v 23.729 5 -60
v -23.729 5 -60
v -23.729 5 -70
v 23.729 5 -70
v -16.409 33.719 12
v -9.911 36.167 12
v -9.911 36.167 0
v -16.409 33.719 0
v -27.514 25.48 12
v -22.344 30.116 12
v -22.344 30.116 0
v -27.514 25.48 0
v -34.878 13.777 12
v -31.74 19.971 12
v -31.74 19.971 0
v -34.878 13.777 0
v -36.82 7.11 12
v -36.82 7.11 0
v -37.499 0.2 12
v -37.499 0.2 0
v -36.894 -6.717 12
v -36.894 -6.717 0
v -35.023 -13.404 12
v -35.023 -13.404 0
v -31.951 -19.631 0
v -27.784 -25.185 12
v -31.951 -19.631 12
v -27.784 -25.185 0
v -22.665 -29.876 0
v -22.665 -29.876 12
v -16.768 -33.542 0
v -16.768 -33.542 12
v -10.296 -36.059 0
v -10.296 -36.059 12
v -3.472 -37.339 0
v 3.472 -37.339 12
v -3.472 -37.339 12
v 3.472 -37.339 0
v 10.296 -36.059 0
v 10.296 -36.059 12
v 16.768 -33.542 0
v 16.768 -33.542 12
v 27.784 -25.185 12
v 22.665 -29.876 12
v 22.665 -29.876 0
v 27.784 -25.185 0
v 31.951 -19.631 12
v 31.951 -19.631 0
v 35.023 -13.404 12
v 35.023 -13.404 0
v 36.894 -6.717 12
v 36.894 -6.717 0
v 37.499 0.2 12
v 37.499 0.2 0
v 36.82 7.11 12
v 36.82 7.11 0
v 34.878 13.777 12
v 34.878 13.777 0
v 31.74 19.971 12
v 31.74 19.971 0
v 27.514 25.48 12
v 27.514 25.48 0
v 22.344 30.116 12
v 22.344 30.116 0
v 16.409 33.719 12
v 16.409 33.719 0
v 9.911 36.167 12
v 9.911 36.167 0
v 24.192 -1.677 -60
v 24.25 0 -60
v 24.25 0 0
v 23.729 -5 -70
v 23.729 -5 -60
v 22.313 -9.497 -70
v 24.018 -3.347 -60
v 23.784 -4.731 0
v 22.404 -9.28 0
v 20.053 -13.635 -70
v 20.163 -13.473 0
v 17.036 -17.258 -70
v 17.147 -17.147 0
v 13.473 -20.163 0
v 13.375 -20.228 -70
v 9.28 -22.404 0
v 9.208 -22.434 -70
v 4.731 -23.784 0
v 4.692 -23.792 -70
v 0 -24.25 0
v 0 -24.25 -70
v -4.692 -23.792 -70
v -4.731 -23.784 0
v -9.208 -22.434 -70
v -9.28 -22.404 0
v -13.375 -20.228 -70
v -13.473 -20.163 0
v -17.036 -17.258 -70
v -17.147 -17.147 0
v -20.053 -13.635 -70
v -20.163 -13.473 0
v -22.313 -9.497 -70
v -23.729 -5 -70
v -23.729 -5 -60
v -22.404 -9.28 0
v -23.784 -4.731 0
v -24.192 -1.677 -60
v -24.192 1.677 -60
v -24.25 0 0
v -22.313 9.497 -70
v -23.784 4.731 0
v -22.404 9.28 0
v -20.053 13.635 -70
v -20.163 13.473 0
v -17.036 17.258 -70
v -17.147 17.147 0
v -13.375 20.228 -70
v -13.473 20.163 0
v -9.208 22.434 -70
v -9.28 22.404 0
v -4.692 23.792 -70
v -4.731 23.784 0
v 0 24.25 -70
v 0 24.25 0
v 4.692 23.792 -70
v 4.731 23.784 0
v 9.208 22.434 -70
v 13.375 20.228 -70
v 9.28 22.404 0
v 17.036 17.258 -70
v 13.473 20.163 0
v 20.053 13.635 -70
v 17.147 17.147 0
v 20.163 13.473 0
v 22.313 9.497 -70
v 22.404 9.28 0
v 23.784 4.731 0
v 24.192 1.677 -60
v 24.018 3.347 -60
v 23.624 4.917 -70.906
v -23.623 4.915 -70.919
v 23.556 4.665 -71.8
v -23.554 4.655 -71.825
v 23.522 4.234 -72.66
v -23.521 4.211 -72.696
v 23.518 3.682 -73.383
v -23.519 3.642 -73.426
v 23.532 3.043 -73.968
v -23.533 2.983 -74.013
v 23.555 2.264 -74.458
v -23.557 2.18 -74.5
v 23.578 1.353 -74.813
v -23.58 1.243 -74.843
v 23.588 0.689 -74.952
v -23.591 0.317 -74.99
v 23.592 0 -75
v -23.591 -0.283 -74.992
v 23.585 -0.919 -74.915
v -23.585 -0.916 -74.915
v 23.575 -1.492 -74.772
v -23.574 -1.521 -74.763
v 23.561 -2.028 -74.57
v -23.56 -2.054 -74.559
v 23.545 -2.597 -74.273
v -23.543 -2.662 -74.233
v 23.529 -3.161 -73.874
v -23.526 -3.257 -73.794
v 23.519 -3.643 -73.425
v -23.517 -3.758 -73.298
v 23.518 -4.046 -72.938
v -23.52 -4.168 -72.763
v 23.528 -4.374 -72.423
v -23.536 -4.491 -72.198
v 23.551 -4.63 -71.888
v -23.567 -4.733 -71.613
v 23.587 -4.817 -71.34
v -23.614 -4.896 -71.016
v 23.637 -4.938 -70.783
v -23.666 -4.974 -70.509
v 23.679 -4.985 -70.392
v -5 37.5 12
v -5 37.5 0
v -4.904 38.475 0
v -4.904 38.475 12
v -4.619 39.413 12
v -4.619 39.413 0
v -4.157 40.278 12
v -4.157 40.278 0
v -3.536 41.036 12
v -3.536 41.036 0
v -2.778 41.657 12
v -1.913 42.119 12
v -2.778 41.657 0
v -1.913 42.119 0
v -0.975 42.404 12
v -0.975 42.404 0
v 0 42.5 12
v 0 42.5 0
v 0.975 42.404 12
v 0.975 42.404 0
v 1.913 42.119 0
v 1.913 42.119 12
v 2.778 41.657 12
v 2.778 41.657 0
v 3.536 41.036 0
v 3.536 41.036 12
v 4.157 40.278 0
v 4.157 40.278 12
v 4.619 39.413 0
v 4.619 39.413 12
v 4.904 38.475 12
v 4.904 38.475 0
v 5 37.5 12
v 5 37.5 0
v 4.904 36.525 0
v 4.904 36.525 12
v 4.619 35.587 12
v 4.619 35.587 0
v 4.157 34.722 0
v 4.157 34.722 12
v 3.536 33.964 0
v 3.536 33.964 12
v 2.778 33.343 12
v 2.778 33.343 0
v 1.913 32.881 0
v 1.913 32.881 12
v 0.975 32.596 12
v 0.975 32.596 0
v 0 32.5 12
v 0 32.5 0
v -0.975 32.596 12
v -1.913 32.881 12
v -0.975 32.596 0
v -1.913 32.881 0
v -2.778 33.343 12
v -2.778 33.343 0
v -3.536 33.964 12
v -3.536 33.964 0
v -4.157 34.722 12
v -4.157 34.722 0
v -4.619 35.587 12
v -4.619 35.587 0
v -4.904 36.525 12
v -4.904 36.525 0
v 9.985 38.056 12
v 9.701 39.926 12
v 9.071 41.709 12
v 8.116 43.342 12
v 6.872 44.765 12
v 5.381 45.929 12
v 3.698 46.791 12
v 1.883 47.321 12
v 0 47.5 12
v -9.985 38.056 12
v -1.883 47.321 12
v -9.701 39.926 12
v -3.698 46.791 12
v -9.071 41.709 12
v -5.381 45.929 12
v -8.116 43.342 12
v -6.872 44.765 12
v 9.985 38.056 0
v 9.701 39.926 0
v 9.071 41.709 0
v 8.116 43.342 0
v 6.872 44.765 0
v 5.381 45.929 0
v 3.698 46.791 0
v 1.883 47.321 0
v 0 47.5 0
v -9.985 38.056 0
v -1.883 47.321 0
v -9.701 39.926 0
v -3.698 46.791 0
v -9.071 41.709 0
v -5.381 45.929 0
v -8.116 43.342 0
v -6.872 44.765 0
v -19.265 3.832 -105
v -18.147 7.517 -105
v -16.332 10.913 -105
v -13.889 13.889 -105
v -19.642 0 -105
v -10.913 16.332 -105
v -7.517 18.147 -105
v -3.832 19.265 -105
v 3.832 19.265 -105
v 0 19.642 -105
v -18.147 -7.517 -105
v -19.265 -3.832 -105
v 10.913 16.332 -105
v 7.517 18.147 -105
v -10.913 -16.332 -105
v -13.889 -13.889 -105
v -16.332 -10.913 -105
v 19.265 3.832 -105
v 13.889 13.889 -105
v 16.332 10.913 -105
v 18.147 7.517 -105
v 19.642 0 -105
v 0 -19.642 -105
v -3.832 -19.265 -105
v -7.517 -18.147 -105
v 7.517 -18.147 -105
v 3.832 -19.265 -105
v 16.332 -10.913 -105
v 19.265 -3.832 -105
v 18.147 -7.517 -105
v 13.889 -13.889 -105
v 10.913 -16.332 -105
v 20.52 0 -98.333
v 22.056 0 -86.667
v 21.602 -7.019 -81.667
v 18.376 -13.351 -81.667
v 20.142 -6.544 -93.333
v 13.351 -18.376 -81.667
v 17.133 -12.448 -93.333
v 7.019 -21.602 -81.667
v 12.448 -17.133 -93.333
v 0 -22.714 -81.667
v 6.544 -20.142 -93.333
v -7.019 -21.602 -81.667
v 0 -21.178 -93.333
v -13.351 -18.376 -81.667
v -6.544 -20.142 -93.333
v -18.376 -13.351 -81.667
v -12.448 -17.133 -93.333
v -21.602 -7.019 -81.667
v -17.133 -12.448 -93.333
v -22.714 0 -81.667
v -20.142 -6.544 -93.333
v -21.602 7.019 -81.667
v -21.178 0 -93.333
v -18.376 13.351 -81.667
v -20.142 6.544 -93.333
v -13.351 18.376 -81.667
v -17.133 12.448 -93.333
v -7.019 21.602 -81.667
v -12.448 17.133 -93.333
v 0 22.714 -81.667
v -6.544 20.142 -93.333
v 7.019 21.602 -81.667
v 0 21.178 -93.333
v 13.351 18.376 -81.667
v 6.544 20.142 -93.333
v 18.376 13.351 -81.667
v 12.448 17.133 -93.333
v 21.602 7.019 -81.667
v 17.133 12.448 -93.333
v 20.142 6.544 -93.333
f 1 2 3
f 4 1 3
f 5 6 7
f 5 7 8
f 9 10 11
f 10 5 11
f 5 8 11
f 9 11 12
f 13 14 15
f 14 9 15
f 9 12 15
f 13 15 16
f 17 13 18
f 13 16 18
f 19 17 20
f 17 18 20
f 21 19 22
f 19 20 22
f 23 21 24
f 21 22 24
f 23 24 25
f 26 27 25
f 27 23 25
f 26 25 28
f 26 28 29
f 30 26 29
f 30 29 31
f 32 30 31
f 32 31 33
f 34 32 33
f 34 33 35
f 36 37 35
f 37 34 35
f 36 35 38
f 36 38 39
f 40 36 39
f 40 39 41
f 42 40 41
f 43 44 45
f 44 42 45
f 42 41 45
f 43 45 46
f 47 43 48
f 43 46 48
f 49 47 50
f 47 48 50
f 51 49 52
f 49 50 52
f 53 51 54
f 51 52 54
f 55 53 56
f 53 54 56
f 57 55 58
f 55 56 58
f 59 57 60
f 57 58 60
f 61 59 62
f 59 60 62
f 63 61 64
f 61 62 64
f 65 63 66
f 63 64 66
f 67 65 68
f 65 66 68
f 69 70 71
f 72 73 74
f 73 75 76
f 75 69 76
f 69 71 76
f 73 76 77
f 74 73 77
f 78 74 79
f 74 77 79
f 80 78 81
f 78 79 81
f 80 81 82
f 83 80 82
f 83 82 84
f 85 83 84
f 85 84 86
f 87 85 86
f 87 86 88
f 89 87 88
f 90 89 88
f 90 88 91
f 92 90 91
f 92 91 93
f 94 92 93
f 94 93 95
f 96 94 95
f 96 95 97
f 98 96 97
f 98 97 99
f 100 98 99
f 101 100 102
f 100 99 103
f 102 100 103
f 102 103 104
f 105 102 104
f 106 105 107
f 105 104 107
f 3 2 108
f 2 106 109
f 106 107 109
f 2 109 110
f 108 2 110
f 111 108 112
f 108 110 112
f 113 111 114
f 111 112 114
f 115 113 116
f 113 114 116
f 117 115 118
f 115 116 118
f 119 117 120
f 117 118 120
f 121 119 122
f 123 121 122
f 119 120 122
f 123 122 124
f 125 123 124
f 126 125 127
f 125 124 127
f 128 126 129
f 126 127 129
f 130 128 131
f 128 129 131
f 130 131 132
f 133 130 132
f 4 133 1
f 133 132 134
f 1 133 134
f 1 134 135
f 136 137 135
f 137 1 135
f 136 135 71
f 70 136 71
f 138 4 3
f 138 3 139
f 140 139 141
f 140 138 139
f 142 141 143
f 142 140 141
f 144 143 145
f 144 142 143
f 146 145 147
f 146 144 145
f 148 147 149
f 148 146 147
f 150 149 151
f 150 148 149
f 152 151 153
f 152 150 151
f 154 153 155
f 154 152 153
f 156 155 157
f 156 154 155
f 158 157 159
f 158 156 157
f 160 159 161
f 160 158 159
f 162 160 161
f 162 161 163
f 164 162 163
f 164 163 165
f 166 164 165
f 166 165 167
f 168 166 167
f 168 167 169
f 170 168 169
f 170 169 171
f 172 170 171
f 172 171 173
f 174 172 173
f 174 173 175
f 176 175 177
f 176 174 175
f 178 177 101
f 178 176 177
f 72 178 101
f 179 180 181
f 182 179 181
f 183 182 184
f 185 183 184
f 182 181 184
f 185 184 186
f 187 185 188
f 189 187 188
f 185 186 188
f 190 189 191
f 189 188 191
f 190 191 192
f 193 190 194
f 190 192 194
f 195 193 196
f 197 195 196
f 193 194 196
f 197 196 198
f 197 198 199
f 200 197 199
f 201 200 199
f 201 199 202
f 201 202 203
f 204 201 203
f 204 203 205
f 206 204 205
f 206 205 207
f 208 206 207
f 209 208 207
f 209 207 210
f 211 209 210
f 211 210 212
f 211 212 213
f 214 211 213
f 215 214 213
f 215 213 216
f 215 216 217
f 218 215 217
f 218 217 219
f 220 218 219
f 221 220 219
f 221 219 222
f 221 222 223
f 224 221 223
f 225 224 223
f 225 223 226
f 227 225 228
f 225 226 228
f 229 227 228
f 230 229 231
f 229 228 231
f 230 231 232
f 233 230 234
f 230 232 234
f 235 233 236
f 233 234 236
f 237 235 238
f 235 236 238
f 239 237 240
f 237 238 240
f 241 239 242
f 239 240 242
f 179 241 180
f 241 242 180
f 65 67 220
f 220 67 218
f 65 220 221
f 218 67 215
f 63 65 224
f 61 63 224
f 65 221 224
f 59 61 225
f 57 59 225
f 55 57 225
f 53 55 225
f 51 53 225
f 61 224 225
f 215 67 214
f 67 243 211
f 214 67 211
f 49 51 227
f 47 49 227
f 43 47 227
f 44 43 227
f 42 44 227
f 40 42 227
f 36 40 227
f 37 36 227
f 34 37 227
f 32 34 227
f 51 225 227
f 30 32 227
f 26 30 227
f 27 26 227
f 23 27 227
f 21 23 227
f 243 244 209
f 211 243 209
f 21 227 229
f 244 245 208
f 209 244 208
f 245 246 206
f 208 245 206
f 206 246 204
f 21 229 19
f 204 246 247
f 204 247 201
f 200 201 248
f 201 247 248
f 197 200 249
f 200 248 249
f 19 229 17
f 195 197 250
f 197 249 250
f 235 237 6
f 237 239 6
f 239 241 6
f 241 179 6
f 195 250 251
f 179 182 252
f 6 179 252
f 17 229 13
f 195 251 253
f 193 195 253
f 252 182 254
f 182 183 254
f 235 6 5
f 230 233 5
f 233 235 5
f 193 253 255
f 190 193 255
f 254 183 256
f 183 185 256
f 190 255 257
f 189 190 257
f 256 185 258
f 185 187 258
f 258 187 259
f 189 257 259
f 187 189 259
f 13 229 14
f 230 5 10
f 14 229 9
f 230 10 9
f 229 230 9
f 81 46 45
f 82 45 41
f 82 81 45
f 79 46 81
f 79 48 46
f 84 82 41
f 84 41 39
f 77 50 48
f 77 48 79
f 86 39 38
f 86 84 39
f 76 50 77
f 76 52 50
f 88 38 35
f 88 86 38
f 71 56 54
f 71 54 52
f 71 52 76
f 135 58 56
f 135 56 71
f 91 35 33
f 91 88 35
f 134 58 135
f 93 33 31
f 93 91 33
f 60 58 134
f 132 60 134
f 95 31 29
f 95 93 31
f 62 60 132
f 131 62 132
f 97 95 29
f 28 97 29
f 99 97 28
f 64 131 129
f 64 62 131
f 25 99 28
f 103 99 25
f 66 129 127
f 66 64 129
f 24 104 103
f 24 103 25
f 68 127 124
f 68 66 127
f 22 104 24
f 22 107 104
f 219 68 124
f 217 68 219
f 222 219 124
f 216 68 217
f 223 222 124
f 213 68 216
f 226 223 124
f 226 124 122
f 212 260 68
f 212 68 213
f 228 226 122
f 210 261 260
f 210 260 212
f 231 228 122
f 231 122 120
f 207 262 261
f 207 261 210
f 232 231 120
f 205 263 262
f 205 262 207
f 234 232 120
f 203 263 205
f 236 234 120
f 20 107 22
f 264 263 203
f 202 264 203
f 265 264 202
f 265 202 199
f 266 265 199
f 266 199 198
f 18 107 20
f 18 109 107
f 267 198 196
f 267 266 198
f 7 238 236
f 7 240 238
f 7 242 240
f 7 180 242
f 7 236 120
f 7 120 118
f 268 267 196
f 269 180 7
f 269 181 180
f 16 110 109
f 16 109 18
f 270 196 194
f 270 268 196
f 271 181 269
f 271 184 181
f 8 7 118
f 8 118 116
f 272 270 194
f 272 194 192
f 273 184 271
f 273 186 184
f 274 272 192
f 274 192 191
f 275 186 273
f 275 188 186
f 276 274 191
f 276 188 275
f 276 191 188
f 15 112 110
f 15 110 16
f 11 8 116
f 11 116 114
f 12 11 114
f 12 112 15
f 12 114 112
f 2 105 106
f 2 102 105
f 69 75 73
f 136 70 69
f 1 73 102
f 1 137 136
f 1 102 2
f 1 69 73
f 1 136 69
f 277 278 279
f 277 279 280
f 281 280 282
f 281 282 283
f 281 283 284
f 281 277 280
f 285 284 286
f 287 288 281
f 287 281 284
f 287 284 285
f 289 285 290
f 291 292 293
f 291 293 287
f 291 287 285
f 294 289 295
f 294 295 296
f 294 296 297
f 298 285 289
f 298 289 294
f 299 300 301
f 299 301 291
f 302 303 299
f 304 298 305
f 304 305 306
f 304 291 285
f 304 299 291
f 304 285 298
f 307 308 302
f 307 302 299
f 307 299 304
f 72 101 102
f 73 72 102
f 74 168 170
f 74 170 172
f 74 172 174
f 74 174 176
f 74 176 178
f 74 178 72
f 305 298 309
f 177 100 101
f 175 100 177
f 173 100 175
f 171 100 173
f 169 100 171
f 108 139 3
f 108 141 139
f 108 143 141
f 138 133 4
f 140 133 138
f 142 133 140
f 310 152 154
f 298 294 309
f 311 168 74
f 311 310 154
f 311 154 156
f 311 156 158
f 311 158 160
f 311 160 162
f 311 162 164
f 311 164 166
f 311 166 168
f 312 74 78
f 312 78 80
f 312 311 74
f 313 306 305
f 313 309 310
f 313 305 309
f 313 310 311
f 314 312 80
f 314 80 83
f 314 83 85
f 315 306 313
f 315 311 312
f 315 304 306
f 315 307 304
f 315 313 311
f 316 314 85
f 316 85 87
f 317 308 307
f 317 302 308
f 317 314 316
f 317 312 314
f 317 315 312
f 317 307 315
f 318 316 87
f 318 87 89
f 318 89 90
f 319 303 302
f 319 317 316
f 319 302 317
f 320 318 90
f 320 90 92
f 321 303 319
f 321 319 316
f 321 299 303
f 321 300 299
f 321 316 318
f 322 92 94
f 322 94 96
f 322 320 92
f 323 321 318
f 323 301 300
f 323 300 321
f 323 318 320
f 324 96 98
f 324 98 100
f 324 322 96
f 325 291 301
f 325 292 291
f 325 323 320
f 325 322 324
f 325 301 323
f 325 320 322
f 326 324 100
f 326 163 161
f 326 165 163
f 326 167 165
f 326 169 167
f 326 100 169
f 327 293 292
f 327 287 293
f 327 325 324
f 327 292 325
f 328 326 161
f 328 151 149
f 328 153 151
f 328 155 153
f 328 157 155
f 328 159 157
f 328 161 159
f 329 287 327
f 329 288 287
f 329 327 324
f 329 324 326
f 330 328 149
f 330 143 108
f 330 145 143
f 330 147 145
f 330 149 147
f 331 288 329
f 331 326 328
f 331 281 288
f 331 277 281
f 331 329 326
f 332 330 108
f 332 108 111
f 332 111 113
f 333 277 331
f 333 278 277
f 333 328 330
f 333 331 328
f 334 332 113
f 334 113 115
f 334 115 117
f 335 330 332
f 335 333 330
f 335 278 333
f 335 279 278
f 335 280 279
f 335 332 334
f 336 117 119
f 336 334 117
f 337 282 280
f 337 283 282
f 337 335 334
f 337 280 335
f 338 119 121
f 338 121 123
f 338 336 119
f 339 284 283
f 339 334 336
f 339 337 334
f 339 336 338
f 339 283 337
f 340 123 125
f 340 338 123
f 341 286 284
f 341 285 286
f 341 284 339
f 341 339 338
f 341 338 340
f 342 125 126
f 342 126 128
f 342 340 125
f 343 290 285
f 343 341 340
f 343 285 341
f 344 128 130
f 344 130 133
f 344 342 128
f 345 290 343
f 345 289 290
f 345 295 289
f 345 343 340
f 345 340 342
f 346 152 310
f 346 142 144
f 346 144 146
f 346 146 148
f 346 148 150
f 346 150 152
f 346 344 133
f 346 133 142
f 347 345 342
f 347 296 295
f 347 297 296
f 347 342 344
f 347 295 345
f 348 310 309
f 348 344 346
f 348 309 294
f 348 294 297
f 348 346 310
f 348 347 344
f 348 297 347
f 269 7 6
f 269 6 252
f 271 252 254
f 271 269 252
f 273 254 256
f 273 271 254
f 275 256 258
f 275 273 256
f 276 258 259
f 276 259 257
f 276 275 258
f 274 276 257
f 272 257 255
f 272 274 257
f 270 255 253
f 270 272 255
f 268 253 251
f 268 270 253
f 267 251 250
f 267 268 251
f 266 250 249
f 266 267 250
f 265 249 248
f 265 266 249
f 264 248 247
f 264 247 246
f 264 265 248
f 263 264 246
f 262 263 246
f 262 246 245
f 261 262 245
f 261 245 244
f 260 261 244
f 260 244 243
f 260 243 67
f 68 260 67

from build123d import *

# Parameters (mm, degrees)
SKETCH_1_R          = 37.5
EXTRUDE_1_DEPTH     = 12
SKETCH_2_R          = 24.25
EXTRUDE_2_DEPTH     = 105
CHAMFER_1_SIZE      = 35
CHAMFER_1_SIZE2     = 4.607837416
CUT_EXTRUDE_3_DEPTH = 178.024009671
SKETCH_6_R          = 10
EXTRUDE_4_DEPTH     = 12
SKETCH_7_R          = 5
CUT_EXTRUDE_5_DEPTH = 122.191996522


with BuildPart() as part:
    # 草图1 → 拉伸1 (new body)
    with BuildSketch(Plane.XY):
        Circle(SKETCH_1_R)
    extrude(amount=EXTRUDE_1_DEPTH)

    # 草图2 → 拉伸2 (add)
    with BuildSketch(Plane(origin=(0, 0, 0), x_dir=(-1, 0, 0), z_dir=(0, 0, -1))):
        with Locations(Location((0, 0, 0), (0, 0, 180))):
            Circle(SKETCH_2_R)
    extrude(amount=EXTRUDE_2_DEPTH)

    # 倒角1
    chamfer_1_edges = [part.edges().sort_by_distance(p)[0] for p in [
        (-24.25, 0, -105),
    ]]
    chamfer_1_side = [part.faces().sort_by_distance(p)[0] for p in [
        (-24.25, 0, -52.5),
    ]]
    chamfer(chamfer_1_edges, length=CHAMFER_1_SIZE, length2=CHAMFER_1_SIZE2, reference=chamfer_1_side[0])

    # 草图3 → 拉伸3 (cut, through all)
    with BuildSketch(Plane(origin=(100, 0, 0), x_dir=(0, 0, -1), z_dir=(1, 0, 0))):
        with BuildLine():
            Line((60, 5), (70, 5))
            ThreePointArc((70, 5), (75, 0), (70, -5))
            Line((70, -5), (60, -5))
            Line((60, -5), (60, 5))
        make_face()
    extrude(amount=-CUT_EXTRUDE_3_DEPTH, mode=Mode.SUBTRACT)

    # 草图6 → 拉伸4 (add)
    with BuildSketch(Plane(origin=(0, 0, 0), x_dir=(-1, 0, 0), z_dir=(0, 0, -1))):
        with Locations((0, 37.5)):
            Circle(SKETCH_6_R)
    extrude(amount=-EXTRUDE_4_DEPTH)

    # 草图7 → 拉伸5 (cut, through all)
    with BuildSketch(Plane(origin=(0, 0, 0), x_dir=(-1, 0, 0), z_dir=(0, 0, -1))):
        with Locations((0, 37.5)):
            Circle(SKETCH_7_R)
    extrude(amount=-CUT_EXTRUDE_5_DEPTH, mode=Mode.SUBTRACT)


solid = part.part
